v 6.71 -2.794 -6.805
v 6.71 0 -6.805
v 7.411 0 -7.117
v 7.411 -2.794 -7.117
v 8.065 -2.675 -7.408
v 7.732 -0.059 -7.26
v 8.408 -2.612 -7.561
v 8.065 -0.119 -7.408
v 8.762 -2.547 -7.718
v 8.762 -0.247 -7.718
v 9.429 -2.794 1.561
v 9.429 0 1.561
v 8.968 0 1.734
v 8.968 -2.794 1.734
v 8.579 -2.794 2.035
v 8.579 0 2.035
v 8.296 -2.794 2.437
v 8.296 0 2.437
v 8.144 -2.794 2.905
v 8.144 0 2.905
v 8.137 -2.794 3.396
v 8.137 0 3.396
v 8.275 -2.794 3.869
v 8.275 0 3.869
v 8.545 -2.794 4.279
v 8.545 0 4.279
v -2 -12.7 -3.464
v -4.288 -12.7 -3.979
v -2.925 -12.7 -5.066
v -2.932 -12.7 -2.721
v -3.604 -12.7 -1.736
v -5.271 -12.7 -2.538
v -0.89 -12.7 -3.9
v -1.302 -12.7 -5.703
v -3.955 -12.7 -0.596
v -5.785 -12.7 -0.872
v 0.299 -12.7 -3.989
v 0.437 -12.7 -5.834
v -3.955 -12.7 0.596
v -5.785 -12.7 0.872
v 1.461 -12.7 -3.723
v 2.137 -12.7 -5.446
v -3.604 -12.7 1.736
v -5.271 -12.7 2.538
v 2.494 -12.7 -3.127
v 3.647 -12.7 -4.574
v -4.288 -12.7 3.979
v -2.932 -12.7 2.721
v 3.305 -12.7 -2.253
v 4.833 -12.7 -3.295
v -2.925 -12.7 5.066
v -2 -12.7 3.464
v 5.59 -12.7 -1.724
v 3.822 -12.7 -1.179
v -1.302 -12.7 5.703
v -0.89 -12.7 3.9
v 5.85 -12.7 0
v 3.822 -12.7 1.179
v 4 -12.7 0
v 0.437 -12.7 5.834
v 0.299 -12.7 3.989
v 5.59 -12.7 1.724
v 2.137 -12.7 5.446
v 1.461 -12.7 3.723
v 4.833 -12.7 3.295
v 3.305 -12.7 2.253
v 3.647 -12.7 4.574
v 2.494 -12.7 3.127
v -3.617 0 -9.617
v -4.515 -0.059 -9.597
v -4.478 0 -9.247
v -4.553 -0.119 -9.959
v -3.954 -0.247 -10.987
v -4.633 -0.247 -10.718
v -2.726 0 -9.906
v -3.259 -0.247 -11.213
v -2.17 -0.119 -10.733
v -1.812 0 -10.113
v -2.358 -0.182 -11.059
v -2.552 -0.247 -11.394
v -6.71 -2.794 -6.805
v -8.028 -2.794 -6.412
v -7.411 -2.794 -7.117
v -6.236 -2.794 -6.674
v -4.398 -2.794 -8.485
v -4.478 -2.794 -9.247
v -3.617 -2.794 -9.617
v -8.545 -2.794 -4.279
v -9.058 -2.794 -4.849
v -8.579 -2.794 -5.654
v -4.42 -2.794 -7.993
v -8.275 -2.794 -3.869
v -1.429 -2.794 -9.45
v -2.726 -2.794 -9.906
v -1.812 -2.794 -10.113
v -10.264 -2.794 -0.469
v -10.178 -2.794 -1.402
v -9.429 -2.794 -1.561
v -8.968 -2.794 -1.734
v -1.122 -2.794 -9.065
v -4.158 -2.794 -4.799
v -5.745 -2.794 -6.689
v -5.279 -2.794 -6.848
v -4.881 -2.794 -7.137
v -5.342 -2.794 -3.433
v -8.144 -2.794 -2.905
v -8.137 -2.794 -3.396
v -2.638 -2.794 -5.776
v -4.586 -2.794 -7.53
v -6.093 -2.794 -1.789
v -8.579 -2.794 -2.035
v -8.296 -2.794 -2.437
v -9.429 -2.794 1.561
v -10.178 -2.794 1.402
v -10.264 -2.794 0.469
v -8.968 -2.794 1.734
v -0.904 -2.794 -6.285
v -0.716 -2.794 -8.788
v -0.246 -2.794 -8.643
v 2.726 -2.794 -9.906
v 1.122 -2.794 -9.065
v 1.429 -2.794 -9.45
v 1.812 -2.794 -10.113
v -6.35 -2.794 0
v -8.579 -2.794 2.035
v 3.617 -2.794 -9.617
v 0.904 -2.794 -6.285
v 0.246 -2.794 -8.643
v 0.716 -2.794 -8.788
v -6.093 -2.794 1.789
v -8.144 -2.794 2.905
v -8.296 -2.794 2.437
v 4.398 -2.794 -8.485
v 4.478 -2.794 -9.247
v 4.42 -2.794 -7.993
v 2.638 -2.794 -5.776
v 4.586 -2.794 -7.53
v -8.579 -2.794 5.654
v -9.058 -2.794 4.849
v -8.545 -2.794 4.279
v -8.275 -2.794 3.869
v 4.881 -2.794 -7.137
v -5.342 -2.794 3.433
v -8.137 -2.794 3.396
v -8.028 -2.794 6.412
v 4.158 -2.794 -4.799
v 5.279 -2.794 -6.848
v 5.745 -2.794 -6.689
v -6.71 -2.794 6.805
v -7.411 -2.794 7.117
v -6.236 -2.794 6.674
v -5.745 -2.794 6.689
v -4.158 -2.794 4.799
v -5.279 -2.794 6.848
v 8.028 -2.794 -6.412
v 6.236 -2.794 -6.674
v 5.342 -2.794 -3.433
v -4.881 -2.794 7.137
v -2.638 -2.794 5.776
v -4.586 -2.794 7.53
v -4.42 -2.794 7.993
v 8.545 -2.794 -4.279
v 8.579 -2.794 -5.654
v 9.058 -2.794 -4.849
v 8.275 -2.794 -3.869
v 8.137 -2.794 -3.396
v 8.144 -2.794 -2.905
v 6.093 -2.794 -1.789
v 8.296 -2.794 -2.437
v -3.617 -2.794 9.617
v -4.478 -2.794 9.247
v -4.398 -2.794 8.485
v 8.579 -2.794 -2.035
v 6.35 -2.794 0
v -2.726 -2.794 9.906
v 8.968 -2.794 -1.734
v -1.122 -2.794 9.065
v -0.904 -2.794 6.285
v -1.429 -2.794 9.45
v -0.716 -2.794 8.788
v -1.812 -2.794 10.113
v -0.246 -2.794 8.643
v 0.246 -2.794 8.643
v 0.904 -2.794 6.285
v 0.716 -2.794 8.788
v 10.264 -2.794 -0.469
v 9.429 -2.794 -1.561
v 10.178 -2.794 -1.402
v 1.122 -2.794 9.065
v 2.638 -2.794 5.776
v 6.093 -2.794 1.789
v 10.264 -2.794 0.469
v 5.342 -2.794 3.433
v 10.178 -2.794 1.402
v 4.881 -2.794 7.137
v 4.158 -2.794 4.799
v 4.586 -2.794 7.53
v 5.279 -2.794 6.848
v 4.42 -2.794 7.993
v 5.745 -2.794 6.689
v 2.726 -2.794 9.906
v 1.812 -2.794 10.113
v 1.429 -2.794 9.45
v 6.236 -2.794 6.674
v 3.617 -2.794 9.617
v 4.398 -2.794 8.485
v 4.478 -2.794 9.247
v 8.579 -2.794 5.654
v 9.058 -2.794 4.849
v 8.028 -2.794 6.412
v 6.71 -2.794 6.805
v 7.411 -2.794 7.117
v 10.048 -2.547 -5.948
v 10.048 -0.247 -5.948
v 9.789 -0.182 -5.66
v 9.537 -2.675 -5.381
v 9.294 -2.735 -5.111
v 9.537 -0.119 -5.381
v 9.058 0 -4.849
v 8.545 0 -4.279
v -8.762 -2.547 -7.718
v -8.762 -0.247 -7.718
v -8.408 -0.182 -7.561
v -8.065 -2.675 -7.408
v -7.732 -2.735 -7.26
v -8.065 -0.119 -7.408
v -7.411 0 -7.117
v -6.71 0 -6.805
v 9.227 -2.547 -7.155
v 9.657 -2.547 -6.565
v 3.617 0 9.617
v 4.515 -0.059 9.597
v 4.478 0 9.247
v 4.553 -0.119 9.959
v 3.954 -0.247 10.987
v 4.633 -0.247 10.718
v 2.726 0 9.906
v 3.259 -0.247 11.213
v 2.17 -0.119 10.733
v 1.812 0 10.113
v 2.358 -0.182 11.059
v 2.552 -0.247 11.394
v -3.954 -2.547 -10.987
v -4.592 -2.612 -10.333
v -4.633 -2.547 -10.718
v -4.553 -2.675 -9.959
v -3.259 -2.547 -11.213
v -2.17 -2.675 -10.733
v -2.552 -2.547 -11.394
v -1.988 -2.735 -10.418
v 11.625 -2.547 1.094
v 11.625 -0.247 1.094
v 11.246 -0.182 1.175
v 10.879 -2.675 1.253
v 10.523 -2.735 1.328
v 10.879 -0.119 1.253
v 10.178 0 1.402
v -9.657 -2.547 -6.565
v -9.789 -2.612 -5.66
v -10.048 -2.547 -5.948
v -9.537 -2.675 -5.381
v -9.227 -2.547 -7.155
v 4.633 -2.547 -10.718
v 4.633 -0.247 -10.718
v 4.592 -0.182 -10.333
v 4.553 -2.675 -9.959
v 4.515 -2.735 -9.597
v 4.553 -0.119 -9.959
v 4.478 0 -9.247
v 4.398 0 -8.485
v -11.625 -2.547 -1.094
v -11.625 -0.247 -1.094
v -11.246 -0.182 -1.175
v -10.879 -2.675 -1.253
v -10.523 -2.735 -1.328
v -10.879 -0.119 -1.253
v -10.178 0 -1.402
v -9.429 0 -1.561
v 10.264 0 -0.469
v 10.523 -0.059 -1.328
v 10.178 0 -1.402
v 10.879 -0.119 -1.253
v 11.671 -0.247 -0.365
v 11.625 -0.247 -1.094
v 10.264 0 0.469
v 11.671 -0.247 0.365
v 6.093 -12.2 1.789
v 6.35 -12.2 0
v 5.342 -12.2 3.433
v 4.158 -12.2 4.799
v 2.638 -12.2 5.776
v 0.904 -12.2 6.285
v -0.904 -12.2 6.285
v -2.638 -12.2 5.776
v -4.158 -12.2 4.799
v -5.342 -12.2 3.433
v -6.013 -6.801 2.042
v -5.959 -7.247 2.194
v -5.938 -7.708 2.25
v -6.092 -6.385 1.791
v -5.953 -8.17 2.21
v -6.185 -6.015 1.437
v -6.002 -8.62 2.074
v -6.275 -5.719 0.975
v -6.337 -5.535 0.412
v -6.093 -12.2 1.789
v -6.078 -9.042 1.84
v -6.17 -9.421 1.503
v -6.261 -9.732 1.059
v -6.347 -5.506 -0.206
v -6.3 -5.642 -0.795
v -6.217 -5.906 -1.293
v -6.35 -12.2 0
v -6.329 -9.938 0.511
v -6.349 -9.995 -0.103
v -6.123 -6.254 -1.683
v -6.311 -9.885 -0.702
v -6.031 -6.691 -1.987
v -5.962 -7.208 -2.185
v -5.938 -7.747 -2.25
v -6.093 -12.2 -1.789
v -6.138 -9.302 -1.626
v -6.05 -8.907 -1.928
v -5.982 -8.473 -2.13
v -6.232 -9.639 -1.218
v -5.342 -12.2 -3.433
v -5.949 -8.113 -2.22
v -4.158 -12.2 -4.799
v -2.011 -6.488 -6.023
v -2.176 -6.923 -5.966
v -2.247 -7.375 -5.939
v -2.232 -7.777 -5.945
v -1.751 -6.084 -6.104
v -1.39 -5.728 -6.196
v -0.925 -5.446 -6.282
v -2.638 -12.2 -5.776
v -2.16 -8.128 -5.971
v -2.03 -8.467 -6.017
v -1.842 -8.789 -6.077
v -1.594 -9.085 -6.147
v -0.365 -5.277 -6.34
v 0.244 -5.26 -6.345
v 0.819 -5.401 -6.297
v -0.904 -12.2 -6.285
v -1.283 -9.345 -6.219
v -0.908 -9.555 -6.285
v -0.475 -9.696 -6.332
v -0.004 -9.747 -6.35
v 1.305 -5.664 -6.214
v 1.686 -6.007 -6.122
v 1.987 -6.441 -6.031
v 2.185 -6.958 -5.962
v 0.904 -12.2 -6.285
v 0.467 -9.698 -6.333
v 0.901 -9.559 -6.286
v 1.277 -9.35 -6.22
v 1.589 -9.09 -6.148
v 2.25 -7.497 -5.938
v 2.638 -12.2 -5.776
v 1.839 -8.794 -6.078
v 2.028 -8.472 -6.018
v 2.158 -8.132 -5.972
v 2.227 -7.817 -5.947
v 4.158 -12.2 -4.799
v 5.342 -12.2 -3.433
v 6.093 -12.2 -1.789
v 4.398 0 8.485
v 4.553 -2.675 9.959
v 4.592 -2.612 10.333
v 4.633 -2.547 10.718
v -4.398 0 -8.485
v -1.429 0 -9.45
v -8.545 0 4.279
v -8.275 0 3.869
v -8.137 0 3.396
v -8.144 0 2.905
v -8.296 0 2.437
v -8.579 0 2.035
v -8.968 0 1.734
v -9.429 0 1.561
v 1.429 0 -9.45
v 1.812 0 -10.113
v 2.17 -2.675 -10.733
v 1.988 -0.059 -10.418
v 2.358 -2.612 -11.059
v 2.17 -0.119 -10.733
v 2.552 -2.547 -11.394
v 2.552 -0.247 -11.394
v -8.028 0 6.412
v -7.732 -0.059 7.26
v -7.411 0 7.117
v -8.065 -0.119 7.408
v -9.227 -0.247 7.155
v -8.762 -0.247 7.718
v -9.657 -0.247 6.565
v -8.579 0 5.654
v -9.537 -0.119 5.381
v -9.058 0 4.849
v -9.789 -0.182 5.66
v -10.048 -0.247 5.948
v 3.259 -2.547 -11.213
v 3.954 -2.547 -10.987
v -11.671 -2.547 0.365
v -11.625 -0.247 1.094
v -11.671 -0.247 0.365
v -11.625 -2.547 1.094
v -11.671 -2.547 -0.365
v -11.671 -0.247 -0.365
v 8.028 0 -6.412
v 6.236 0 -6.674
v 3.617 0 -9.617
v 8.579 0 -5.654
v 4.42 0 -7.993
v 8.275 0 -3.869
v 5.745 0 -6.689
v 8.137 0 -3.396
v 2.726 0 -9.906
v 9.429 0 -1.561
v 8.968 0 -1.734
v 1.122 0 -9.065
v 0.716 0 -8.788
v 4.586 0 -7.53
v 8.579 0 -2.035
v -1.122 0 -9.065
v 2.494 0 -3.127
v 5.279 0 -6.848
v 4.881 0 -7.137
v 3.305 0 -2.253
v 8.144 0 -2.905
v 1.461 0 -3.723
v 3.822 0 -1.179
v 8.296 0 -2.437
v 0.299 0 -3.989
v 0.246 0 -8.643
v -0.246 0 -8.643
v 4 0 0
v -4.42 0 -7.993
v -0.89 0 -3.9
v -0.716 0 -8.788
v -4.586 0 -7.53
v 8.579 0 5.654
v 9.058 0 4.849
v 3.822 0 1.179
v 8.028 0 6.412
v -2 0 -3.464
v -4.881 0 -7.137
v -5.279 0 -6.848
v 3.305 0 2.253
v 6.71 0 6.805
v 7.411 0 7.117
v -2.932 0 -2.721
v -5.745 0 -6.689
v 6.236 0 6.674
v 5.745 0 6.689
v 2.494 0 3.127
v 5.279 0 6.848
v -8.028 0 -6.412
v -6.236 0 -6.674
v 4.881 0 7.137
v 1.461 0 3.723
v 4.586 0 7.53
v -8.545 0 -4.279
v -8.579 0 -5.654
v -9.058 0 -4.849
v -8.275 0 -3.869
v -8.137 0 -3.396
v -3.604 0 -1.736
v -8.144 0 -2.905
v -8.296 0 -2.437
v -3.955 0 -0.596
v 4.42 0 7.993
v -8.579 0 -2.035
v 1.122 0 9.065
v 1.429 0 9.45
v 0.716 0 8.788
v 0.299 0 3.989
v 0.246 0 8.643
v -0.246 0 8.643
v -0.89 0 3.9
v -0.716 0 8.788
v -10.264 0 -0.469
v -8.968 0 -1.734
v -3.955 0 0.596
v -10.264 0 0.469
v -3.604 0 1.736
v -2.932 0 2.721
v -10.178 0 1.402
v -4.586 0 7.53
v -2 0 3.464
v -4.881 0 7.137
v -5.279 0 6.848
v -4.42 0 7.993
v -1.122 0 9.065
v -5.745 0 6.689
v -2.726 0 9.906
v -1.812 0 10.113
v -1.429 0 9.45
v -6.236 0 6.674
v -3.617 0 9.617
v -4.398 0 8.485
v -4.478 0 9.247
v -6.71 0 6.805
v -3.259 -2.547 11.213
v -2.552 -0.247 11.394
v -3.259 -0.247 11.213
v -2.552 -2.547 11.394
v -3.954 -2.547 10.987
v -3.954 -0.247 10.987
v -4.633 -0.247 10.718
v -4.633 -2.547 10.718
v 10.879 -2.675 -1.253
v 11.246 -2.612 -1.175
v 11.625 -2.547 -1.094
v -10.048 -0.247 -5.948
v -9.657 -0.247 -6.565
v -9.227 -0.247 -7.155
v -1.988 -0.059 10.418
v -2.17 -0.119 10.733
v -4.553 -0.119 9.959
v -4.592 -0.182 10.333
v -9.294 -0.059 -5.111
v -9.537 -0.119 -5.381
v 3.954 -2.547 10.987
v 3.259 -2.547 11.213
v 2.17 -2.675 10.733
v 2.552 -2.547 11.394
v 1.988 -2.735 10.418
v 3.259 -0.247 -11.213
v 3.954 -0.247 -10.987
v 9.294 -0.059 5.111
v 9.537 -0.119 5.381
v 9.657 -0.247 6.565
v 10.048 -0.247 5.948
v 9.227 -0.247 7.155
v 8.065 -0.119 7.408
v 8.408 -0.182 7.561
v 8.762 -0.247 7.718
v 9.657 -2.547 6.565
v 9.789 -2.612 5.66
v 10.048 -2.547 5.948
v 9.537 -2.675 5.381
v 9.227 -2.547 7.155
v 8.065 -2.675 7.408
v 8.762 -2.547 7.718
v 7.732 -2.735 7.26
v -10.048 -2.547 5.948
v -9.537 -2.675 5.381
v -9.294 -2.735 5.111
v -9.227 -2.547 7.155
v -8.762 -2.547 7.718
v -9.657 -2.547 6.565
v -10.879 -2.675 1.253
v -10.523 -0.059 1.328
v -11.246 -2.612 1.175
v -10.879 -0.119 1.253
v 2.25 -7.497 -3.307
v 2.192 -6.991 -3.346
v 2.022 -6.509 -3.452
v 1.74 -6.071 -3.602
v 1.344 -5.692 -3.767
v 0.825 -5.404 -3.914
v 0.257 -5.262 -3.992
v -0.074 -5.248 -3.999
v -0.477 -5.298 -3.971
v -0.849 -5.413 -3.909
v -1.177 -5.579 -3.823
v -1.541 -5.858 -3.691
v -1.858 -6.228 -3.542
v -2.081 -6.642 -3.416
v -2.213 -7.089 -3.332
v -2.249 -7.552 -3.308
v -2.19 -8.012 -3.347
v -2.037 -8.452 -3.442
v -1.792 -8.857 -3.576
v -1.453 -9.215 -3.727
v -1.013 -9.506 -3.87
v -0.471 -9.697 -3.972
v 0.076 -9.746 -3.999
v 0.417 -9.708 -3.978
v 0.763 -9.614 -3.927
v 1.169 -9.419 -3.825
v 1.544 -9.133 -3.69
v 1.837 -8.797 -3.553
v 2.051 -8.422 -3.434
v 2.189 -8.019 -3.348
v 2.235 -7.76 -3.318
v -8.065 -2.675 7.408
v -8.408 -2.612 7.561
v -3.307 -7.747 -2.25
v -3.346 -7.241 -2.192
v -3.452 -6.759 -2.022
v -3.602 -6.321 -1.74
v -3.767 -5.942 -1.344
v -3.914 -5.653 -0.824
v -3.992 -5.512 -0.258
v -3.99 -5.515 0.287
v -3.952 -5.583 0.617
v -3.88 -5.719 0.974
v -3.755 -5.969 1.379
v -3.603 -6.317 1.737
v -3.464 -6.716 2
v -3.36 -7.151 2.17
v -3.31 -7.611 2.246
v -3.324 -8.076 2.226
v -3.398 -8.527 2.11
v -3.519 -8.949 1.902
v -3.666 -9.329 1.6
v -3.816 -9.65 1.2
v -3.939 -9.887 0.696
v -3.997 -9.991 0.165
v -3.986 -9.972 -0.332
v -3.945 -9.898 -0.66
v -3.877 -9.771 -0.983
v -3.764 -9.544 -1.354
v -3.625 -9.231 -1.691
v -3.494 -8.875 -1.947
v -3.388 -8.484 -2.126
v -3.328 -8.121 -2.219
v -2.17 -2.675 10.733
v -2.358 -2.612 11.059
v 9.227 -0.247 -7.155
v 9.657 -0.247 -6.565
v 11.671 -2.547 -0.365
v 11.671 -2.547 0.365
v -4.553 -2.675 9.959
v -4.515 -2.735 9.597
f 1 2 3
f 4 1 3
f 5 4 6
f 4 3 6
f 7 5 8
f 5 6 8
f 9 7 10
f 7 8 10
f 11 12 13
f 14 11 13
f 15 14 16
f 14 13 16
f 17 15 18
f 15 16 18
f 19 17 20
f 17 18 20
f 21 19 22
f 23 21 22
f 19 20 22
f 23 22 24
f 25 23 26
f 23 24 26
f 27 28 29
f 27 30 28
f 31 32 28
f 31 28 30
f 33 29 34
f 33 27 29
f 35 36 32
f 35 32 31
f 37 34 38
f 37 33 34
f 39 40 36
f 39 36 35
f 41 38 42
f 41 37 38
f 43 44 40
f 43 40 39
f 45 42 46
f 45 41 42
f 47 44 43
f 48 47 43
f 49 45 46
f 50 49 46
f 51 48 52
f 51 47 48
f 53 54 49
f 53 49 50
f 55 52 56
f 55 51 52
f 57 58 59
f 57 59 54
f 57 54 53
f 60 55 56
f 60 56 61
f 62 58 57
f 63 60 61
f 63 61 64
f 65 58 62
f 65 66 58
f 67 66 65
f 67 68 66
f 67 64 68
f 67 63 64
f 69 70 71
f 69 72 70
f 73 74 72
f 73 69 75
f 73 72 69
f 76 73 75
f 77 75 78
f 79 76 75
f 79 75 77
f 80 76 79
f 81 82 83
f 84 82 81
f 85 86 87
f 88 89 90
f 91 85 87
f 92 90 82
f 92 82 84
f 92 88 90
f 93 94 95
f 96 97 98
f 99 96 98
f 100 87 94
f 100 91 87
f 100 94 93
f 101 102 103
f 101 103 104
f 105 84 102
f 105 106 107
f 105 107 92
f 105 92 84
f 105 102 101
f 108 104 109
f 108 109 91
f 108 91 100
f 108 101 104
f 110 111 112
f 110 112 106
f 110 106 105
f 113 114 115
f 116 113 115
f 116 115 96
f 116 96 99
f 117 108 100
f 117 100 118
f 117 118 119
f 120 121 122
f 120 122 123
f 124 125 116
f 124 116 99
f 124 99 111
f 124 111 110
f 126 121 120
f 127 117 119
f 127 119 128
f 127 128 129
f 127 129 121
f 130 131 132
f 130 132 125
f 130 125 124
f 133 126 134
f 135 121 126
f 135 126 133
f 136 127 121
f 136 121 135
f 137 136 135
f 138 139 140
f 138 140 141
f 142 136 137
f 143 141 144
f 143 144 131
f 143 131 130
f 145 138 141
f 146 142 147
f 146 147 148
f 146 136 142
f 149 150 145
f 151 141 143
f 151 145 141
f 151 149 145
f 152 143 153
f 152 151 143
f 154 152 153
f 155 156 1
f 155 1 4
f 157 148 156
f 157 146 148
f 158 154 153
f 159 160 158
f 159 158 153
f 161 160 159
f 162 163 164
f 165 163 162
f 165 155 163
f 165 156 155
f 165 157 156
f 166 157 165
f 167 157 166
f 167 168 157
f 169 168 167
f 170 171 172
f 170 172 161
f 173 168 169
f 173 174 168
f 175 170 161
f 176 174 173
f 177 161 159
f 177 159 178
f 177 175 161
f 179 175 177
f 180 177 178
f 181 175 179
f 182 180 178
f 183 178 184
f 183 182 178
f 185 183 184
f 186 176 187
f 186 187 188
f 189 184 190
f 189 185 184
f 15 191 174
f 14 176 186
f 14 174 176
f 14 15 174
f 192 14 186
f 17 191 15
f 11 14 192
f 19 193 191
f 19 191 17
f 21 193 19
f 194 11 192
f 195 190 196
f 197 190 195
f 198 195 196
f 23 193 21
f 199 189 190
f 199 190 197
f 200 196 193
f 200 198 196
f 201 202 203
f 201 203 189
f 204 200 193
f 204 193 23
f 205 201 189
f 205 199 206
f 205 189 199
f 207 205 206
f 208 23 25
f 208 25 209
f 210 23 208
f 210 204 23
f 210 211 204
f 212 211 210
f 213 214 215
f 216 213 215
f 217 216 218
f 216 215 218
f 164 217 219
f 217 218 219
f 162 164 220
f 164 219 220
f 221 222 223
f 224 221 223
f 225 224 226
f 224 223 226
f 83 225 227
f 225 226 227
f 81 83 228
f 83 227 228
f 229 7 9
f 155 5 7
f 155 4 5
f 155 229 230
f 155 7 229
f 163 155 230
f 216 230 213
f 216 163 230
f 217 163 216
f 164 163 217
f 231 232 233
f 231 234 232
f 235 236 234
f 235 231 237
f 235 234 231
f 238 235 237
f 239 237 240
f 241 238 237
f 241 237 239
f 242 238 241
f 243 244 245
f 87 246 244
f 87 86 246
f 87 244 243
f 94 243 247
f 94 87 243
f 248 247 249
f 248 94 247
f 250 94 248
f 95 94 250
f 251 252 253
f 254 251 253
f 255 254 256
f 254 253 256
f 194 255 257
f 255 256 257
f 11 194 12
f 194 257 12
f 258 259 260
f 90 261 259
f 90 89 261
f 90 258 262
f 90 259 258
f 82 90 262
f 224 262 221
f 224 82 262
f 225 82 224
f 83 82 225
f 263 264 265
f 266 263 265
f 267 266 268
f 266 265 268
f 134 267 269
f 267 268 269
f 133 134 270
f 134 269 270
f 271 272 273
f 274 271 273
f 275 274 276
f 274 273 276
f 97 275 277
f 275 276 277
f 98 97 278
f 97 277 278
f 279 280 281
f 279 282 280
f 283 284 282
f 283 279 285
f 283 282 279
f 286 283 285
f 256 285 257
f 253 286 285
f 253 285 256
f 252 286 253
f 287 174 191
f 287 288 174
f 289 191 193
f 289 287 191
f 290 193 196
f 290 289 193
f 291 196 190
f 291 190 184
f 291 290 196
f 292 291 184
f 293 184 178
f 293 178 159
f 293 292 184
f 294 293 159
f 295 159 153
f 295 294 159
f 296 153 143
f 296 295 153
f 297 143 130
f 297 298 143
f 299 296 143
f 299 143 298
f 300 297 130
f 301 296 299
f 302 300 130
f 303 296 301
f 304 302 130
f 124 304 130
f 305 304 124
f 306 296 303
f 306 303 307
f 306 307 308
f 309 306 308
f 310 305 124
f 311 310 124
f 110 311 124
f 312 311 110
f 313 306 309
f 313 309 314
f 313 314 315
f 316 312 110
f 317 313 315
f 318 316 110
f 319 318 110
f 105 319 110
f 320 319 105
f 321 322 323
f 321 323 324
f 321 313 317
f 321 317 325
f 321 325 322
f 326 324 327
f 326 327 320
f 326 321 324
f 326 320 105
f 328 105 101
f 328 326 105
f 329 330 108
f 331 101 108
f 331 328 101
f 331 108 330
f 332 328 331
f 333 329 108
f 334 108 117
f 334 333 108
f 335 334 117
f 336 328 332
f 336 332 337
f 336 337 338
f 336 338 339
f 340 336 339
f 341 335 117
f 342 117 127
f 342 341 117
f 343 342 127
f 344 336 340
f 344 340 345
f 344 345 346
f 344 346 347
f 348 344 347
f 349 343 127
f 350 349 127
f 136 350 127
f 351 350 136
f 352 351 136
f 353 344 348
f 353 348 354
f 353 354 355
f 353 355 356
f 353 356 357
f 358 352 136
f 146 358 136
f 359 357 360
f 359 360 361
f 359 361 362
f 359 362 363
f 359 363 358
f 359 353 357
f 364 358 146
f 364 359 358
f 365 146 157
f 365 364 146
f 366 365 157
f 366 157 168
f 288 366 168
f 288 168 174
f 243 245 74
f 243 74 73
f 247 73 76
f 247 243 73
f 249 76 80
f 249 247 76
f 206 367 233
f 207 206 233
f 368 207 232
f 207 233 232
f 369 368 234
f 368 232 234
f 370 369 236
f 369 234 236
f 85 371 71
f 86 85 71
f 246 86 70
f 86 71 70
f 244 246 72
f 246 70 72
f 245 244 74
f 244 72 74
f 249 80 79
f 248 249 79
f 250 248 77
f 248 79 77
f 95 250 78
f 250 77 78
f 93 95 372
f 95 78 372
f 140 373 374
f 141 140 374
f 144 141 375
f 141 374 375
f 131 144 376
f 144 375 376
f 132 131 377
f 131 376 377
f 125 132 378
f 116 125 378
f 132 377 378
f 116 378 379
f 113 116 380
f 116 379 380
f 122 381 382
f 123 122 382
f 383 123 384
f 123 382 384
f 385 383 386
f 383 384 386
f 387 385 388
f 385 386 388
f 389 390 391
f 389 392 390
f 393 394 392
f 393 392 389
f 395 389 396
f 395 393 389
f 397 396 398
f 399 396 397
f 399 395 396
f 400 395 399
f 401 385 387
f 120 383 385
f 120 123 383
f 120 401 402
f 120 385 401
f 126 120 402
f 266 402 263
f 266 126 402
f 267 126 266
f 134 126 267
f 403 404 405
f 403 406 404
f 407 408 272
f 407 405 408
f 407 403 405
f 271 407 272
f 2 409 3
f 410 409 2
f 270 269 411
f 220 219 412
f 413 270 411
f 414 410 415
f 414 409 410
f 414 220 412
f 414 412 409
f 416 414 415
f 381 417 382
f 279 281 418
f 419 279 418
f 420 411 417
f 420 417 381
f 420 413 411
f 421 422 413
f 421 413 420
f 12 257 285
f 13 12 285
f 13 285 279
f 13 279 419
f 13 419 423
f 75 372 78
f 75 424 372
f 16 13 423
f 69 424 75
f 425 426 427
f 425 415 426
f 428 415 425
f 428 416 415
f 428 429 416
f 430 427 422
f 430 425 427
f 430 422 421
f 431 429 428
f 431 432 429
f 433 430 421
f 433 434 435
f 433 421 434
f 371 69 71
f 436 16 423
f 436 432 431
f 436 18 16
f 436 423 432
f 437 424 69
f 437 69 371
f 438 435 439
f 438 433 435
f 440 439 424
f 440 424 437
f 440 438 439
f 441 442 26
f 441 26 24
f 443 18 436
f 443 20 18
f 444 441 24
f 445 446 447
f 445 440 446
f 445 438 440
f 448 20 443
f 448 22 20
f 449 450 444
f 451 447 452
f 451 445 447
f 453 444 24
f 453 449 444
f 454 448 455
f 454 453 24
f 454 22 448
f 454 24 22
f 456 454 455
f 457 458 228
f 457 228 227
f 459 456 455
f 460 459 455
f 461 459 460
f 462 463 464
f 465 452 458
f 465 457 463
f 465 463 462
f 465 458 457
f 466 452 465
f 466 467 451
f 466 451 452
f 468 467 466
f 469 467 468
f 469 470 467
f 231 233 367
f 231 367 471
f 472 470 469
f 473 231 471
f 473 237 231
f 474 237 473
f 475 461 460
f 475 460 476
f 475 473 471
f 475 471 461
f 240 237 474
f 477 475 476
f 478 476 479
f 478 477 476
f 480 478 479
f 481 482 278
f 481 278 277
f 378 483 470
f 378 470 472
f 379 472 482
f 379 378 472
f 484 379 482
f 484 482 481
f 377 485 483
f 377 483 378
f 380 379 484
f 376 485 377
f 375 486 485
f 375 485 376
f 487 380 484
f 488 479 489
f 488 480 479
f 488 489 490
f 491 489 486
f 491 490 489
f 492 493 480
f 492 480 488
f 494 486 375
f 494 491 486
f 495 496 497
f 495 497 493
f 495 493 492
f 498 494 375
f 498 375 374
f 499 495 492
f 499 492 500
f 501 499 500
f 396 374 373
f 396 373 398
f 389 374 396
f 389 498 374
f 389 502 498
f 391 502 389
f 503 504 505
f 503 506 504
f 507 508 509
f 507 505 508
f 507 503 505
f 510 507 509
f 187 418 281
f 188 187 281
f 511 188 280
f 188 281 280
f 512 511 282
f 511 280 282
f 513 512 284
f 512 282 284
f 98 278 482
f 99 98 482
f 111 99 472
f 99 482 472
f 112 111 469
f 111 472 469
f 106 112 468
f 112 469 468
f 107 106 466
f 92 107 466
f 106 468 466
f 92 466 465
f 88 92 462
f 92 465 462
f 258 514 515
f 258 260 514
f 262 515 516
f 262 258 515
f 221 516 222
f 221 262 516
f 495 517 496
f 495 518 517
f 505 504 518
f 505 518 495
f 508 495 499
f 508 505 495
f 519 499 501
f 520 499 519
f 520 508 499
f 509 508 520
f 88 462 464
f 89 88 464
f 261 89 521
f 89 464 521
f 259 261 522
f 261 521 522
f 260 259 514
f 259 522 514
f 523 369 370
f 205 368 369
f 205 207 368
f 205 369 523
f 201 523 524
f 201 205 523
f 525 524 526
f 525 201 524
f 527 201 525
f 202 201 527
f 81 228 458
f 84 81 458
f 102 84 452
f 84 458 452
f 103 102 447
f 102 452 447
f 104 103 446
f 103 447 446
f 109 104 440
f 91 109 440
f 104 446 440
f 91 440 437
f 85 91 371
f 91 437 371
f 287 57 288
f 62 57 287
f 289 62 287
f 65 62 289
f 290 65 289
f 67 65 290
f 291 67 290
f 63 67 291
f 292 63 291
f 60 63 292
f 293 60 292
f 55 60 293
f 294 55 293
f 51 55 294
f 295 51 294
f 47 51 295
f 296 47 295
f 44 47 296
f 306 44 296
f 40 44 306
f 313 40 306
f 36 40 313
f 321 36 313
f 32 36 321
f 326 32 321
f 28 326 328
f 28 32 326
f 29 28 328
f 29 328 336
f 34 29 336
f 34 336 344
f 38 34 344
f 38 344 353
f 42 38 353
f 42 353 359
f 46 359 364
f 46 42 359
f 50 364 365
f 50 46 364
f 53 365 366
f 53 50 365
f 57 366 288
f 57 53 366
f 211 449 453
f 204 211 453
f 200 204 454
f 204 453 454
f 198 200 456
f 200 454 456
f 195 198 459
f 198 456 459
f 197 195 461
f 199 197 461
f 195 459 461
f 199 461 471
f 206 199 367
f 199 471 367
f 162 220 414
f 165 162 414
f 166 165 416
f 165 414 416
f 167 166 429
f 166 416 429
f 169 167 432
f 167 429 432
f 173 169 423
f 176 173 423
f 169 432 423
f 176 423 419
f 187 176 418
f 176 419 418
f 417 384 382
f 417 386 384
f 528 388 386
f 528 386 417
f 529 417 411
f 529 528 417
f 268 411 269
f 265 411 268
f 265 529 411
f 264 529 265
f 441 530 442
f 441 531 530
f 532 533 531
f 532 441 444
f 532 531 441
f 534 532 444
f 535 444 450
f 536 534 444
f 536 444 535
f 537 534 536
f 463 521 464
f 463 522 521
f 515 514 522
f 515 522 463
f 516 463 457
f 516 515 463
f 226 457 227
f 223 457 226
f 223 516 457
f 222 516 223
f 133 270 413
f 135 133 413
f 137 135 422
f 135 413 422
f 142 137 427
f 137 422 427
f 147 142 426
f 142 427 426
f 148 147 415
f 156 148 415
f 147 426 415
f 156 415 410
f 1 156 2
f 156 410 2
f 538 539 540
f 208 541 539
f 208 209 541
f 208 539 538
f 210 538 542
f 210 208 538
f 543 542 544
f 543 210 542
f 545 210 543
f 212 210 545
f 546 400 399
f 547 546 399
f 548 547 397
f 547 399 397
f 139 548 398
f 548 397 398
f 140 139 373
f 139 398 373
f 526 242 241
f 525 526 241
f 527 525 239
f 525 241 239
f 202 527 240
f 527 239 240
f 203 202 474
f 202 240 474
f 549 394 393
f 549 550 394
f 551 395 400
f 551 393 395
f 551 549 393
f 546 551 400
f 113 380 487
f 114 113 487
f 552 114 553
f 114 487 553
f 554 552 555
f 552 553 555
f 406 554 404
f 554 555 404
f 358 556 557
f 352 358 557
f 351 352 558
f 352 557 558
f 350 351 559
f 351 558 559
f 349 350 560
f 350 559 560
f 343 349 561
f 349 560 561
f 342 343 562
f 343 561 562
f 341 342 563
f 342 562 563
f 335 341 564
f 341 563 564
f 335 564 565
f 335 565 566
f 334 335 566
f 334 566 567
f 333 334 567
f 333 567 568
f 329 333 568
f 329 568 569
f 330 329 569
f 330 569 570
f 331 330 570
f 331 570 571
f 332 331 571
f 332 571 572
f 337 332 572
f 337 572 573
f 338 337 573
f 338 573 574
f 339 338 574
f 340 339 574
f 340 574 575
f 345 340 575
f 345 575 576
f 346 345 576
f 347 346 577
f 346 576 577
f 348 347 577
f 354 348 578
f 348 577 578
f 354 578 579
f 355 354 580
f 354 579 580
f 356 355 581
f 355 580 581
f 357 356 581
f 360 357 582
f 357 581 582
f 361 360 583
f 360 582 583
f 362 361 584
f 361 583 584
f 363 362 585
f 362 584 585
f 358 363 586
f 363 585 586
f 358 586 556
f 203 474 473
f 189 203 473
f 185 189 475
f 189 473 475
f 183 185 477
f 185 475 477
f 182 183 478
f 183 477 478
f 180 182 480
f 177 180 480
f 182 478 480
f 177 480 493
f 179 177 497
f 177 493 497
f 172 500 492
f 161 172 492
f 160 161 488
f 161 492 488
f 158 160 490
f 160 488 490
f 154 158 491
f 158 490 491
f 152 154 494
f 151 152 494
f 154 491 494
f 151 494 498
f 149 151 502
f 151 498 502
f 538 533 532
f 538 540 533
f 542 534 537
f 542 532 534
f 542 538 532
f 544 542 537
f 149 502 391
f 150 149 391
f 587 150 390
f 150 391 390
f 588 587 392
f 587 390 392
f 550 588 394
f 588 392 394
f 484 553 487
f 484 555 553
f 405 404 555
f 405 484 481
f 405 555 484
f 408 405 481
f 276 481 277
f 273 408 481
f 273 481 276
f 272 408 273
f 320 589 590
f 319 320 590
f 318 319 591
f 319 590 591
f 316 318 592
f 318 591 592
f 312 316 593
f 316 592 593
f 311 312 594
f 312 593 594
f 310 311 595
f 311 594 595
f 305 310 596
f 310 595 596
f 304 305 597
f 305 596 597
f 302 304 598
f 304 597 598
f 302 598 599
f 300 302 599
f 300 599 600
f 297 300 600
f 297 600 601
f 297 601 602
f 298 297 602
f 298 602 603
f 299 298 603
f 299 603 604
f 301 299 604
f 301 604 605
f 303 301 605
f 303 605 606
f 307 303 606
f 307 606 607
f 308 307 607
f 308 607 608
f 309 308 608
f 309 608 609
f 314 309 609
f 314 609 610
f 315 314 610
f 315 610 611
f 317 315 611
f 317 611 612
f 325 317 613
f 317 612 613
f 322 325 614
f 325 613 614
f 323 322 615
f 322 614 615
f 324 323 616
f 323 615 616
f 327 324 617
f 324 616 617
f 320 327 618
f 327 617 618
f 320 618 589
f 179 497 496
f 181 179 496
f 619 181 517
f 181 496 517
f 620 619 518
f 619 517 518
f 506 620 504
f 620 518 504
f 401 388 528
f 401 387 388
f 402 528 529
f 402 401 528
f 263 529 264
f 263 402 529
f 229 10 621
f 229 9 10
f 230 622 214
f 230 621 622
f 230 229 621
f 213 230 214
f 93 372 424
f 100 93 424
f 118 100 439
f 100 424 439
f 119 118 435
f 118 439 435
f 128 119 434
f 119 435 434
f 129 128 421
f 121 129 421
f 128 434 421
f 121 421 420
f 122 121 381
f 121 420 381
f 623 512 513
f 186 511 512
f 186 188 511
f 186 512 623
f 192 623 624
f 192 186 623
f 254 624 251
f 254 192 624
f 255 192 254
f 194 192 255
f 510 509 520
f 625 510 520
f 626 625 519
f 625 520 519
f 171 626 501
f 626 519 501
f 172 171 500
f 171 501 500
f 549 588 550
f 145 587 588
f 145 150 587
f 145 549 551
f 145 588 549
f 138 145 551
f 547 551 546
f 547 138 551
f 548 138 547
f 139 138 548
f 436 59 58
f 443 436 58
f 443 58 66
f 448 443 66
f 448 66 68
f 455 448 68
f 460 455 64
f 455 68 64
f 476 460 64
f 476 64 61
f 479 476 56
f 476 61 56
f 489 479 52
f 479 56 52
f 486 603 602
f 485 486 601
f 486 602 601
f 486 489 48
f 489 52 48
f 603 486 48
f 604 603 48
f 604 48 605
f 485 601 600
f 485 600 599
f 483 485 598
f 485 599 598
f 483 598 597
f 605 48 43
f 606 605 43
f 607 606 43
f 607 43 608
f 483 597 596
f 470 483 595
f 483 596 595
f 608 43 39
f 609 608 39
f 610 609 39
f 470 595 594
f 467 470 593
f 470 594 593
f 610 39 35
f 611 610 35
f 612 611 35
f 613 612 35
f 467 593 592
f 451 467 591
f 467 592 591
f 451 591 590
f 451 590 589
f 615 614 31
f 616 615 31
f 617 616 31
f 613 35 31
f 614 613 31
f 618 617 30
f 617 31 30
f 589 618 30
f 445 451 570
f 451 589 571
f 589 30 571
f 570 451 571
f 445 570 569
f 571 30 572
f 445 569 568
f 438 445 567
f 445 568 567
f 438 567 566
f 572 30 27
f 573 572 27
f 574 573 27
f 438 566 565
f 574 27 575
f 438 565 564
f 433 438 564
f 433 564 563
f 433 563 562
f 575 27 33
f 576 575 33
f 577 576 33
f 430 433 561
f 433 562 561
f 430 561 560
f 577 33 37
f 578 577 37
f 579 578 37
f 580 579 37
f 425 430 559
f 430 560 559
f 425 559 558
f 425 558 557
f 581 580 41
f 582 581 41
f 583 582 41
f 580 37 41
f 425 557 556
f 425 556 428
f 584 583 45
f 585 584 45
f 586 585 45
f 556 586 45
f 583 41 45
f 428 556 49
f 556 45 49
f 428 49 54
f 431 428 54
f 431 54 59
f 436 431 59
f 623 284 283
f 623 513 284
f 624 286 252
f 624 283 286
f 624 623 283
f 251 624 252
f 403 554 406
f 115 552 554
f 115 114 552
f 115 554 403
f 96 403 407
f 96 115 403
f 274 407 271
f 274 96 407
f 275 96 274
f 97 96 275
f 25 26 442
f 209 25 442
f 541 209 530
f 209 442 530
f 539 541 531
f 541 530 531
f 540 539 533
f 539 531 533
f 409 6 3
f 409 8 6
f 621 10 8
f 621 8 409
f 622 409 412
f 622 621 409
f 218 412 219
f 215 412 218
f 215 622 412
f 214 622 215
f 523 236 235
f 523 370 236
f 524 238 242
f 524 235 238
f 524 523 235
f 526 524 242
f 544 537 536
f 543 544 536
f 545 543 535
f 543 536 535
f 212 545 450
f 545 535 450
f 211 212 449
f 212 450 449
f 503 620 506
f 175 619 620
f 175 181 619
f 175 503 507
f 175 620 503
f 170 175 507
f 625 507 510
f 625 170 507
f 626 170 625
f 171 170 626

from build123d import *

# Parameters (mm, degrees)
CUT_EXTRUDE1_DEPTH = 2.794
CIRPATTERN1_COUNT  = 10
SKETCH3_R          = 4
CUT_EXTRUDE2_DEPTH = 13.7
SKETCH4_R          = 2.25
CUT_EXTRUDE3_DEPTH = 10
SKETCH5_R          = 2.25
CUT_EXTRUDE4_DEPTH = 10


with BuildPart() as part:
    # Sketch1 → Revolve2 (revolve)
    with BuildSketch(Plane.XY):
        Polygon((0, 0), (10.274515829, 0), (11.676645231, -0.247233244), (11.676645231, -2.546766756), (10.274515829, -2.794), (6.35, -2.794), (6.35, -12.2), (5.85, -12.7), (0, -12.7), align=None)
    revolve(axis=Axis((0, 0, 0), (0, -1, 0)))

    # Sketch2 → Cut-Extrude1 (cut)
    with BuildSketch(Plane(origin=(0, 0, 0), x_dir=(1, 0, 0), z_dir=(0, 1, 0))):
        with BuildLine():
            Line((1.428941916, 9.449515829), (2.551819083, 11.394396132))
            ThreePointArc((2.551819083, 11.394396132), (0, 11.676645231), (-2.551819083, 11.394396132))
            Line((-2.551819083, 11.394396132), (-1.428941916, 9.449515829))
            ThreePointArc((-1.428941916, 9.449515829), (0, 8.624515829), (1.428941916, 9.449515829))
        make_face()
    cut_extrude1 = extrude(amount=-CUT_EXTRUDE1_DEPTH, mode=Mode.SUBTRACT)

    # CirPattern1: Cut-Extrude1 ×10 about axis
    cirpattern1_axis = Axis((0, 0, 0), (0, 1, 0))
    for i in range(1, CIRPATTERN1_COUNT):
        add(cut_extrude1.rotate(cirpattern1_axis, i * 360 / CIRPATTERN1_COUNT), mode=Mode.SUBTRACT)

    # Sketch3 → Cut-Extrude2 (cut, through all)
    with BuildSketch(Plane.XZ.offset(12.7)):
        Circle(SKETCH3_R)
    extrude(amount=-CUT_EXTRUDE2_DEPTH, mode=Mode.SUBTRACT)

    # Sketch4 → Cut-Extrude3 (cut)
    with BuildSketch(Plane(origin=(0, 0, 0), x_dir=(0, 0, -1), z_dir=(1, 0, 0))):
        with Locations((0, -7.747)):
            Circle(SKETCH4_R)
    extrude(amount=-CUT_EXTRUDE3_DEPTH, mode=Mode.SUBTRACT)

    # Sketch5 → Cut-Extrude4 (cut)
    with BuildSketch(Plane.XY):
        with Locations((0, -7.497)):
            Circle(SKETCH5_R)
    extrude(amount=-CUT_EXTRUDE4_DEPTH, mode=Mode.SUBTRACT)


solid = part.part
